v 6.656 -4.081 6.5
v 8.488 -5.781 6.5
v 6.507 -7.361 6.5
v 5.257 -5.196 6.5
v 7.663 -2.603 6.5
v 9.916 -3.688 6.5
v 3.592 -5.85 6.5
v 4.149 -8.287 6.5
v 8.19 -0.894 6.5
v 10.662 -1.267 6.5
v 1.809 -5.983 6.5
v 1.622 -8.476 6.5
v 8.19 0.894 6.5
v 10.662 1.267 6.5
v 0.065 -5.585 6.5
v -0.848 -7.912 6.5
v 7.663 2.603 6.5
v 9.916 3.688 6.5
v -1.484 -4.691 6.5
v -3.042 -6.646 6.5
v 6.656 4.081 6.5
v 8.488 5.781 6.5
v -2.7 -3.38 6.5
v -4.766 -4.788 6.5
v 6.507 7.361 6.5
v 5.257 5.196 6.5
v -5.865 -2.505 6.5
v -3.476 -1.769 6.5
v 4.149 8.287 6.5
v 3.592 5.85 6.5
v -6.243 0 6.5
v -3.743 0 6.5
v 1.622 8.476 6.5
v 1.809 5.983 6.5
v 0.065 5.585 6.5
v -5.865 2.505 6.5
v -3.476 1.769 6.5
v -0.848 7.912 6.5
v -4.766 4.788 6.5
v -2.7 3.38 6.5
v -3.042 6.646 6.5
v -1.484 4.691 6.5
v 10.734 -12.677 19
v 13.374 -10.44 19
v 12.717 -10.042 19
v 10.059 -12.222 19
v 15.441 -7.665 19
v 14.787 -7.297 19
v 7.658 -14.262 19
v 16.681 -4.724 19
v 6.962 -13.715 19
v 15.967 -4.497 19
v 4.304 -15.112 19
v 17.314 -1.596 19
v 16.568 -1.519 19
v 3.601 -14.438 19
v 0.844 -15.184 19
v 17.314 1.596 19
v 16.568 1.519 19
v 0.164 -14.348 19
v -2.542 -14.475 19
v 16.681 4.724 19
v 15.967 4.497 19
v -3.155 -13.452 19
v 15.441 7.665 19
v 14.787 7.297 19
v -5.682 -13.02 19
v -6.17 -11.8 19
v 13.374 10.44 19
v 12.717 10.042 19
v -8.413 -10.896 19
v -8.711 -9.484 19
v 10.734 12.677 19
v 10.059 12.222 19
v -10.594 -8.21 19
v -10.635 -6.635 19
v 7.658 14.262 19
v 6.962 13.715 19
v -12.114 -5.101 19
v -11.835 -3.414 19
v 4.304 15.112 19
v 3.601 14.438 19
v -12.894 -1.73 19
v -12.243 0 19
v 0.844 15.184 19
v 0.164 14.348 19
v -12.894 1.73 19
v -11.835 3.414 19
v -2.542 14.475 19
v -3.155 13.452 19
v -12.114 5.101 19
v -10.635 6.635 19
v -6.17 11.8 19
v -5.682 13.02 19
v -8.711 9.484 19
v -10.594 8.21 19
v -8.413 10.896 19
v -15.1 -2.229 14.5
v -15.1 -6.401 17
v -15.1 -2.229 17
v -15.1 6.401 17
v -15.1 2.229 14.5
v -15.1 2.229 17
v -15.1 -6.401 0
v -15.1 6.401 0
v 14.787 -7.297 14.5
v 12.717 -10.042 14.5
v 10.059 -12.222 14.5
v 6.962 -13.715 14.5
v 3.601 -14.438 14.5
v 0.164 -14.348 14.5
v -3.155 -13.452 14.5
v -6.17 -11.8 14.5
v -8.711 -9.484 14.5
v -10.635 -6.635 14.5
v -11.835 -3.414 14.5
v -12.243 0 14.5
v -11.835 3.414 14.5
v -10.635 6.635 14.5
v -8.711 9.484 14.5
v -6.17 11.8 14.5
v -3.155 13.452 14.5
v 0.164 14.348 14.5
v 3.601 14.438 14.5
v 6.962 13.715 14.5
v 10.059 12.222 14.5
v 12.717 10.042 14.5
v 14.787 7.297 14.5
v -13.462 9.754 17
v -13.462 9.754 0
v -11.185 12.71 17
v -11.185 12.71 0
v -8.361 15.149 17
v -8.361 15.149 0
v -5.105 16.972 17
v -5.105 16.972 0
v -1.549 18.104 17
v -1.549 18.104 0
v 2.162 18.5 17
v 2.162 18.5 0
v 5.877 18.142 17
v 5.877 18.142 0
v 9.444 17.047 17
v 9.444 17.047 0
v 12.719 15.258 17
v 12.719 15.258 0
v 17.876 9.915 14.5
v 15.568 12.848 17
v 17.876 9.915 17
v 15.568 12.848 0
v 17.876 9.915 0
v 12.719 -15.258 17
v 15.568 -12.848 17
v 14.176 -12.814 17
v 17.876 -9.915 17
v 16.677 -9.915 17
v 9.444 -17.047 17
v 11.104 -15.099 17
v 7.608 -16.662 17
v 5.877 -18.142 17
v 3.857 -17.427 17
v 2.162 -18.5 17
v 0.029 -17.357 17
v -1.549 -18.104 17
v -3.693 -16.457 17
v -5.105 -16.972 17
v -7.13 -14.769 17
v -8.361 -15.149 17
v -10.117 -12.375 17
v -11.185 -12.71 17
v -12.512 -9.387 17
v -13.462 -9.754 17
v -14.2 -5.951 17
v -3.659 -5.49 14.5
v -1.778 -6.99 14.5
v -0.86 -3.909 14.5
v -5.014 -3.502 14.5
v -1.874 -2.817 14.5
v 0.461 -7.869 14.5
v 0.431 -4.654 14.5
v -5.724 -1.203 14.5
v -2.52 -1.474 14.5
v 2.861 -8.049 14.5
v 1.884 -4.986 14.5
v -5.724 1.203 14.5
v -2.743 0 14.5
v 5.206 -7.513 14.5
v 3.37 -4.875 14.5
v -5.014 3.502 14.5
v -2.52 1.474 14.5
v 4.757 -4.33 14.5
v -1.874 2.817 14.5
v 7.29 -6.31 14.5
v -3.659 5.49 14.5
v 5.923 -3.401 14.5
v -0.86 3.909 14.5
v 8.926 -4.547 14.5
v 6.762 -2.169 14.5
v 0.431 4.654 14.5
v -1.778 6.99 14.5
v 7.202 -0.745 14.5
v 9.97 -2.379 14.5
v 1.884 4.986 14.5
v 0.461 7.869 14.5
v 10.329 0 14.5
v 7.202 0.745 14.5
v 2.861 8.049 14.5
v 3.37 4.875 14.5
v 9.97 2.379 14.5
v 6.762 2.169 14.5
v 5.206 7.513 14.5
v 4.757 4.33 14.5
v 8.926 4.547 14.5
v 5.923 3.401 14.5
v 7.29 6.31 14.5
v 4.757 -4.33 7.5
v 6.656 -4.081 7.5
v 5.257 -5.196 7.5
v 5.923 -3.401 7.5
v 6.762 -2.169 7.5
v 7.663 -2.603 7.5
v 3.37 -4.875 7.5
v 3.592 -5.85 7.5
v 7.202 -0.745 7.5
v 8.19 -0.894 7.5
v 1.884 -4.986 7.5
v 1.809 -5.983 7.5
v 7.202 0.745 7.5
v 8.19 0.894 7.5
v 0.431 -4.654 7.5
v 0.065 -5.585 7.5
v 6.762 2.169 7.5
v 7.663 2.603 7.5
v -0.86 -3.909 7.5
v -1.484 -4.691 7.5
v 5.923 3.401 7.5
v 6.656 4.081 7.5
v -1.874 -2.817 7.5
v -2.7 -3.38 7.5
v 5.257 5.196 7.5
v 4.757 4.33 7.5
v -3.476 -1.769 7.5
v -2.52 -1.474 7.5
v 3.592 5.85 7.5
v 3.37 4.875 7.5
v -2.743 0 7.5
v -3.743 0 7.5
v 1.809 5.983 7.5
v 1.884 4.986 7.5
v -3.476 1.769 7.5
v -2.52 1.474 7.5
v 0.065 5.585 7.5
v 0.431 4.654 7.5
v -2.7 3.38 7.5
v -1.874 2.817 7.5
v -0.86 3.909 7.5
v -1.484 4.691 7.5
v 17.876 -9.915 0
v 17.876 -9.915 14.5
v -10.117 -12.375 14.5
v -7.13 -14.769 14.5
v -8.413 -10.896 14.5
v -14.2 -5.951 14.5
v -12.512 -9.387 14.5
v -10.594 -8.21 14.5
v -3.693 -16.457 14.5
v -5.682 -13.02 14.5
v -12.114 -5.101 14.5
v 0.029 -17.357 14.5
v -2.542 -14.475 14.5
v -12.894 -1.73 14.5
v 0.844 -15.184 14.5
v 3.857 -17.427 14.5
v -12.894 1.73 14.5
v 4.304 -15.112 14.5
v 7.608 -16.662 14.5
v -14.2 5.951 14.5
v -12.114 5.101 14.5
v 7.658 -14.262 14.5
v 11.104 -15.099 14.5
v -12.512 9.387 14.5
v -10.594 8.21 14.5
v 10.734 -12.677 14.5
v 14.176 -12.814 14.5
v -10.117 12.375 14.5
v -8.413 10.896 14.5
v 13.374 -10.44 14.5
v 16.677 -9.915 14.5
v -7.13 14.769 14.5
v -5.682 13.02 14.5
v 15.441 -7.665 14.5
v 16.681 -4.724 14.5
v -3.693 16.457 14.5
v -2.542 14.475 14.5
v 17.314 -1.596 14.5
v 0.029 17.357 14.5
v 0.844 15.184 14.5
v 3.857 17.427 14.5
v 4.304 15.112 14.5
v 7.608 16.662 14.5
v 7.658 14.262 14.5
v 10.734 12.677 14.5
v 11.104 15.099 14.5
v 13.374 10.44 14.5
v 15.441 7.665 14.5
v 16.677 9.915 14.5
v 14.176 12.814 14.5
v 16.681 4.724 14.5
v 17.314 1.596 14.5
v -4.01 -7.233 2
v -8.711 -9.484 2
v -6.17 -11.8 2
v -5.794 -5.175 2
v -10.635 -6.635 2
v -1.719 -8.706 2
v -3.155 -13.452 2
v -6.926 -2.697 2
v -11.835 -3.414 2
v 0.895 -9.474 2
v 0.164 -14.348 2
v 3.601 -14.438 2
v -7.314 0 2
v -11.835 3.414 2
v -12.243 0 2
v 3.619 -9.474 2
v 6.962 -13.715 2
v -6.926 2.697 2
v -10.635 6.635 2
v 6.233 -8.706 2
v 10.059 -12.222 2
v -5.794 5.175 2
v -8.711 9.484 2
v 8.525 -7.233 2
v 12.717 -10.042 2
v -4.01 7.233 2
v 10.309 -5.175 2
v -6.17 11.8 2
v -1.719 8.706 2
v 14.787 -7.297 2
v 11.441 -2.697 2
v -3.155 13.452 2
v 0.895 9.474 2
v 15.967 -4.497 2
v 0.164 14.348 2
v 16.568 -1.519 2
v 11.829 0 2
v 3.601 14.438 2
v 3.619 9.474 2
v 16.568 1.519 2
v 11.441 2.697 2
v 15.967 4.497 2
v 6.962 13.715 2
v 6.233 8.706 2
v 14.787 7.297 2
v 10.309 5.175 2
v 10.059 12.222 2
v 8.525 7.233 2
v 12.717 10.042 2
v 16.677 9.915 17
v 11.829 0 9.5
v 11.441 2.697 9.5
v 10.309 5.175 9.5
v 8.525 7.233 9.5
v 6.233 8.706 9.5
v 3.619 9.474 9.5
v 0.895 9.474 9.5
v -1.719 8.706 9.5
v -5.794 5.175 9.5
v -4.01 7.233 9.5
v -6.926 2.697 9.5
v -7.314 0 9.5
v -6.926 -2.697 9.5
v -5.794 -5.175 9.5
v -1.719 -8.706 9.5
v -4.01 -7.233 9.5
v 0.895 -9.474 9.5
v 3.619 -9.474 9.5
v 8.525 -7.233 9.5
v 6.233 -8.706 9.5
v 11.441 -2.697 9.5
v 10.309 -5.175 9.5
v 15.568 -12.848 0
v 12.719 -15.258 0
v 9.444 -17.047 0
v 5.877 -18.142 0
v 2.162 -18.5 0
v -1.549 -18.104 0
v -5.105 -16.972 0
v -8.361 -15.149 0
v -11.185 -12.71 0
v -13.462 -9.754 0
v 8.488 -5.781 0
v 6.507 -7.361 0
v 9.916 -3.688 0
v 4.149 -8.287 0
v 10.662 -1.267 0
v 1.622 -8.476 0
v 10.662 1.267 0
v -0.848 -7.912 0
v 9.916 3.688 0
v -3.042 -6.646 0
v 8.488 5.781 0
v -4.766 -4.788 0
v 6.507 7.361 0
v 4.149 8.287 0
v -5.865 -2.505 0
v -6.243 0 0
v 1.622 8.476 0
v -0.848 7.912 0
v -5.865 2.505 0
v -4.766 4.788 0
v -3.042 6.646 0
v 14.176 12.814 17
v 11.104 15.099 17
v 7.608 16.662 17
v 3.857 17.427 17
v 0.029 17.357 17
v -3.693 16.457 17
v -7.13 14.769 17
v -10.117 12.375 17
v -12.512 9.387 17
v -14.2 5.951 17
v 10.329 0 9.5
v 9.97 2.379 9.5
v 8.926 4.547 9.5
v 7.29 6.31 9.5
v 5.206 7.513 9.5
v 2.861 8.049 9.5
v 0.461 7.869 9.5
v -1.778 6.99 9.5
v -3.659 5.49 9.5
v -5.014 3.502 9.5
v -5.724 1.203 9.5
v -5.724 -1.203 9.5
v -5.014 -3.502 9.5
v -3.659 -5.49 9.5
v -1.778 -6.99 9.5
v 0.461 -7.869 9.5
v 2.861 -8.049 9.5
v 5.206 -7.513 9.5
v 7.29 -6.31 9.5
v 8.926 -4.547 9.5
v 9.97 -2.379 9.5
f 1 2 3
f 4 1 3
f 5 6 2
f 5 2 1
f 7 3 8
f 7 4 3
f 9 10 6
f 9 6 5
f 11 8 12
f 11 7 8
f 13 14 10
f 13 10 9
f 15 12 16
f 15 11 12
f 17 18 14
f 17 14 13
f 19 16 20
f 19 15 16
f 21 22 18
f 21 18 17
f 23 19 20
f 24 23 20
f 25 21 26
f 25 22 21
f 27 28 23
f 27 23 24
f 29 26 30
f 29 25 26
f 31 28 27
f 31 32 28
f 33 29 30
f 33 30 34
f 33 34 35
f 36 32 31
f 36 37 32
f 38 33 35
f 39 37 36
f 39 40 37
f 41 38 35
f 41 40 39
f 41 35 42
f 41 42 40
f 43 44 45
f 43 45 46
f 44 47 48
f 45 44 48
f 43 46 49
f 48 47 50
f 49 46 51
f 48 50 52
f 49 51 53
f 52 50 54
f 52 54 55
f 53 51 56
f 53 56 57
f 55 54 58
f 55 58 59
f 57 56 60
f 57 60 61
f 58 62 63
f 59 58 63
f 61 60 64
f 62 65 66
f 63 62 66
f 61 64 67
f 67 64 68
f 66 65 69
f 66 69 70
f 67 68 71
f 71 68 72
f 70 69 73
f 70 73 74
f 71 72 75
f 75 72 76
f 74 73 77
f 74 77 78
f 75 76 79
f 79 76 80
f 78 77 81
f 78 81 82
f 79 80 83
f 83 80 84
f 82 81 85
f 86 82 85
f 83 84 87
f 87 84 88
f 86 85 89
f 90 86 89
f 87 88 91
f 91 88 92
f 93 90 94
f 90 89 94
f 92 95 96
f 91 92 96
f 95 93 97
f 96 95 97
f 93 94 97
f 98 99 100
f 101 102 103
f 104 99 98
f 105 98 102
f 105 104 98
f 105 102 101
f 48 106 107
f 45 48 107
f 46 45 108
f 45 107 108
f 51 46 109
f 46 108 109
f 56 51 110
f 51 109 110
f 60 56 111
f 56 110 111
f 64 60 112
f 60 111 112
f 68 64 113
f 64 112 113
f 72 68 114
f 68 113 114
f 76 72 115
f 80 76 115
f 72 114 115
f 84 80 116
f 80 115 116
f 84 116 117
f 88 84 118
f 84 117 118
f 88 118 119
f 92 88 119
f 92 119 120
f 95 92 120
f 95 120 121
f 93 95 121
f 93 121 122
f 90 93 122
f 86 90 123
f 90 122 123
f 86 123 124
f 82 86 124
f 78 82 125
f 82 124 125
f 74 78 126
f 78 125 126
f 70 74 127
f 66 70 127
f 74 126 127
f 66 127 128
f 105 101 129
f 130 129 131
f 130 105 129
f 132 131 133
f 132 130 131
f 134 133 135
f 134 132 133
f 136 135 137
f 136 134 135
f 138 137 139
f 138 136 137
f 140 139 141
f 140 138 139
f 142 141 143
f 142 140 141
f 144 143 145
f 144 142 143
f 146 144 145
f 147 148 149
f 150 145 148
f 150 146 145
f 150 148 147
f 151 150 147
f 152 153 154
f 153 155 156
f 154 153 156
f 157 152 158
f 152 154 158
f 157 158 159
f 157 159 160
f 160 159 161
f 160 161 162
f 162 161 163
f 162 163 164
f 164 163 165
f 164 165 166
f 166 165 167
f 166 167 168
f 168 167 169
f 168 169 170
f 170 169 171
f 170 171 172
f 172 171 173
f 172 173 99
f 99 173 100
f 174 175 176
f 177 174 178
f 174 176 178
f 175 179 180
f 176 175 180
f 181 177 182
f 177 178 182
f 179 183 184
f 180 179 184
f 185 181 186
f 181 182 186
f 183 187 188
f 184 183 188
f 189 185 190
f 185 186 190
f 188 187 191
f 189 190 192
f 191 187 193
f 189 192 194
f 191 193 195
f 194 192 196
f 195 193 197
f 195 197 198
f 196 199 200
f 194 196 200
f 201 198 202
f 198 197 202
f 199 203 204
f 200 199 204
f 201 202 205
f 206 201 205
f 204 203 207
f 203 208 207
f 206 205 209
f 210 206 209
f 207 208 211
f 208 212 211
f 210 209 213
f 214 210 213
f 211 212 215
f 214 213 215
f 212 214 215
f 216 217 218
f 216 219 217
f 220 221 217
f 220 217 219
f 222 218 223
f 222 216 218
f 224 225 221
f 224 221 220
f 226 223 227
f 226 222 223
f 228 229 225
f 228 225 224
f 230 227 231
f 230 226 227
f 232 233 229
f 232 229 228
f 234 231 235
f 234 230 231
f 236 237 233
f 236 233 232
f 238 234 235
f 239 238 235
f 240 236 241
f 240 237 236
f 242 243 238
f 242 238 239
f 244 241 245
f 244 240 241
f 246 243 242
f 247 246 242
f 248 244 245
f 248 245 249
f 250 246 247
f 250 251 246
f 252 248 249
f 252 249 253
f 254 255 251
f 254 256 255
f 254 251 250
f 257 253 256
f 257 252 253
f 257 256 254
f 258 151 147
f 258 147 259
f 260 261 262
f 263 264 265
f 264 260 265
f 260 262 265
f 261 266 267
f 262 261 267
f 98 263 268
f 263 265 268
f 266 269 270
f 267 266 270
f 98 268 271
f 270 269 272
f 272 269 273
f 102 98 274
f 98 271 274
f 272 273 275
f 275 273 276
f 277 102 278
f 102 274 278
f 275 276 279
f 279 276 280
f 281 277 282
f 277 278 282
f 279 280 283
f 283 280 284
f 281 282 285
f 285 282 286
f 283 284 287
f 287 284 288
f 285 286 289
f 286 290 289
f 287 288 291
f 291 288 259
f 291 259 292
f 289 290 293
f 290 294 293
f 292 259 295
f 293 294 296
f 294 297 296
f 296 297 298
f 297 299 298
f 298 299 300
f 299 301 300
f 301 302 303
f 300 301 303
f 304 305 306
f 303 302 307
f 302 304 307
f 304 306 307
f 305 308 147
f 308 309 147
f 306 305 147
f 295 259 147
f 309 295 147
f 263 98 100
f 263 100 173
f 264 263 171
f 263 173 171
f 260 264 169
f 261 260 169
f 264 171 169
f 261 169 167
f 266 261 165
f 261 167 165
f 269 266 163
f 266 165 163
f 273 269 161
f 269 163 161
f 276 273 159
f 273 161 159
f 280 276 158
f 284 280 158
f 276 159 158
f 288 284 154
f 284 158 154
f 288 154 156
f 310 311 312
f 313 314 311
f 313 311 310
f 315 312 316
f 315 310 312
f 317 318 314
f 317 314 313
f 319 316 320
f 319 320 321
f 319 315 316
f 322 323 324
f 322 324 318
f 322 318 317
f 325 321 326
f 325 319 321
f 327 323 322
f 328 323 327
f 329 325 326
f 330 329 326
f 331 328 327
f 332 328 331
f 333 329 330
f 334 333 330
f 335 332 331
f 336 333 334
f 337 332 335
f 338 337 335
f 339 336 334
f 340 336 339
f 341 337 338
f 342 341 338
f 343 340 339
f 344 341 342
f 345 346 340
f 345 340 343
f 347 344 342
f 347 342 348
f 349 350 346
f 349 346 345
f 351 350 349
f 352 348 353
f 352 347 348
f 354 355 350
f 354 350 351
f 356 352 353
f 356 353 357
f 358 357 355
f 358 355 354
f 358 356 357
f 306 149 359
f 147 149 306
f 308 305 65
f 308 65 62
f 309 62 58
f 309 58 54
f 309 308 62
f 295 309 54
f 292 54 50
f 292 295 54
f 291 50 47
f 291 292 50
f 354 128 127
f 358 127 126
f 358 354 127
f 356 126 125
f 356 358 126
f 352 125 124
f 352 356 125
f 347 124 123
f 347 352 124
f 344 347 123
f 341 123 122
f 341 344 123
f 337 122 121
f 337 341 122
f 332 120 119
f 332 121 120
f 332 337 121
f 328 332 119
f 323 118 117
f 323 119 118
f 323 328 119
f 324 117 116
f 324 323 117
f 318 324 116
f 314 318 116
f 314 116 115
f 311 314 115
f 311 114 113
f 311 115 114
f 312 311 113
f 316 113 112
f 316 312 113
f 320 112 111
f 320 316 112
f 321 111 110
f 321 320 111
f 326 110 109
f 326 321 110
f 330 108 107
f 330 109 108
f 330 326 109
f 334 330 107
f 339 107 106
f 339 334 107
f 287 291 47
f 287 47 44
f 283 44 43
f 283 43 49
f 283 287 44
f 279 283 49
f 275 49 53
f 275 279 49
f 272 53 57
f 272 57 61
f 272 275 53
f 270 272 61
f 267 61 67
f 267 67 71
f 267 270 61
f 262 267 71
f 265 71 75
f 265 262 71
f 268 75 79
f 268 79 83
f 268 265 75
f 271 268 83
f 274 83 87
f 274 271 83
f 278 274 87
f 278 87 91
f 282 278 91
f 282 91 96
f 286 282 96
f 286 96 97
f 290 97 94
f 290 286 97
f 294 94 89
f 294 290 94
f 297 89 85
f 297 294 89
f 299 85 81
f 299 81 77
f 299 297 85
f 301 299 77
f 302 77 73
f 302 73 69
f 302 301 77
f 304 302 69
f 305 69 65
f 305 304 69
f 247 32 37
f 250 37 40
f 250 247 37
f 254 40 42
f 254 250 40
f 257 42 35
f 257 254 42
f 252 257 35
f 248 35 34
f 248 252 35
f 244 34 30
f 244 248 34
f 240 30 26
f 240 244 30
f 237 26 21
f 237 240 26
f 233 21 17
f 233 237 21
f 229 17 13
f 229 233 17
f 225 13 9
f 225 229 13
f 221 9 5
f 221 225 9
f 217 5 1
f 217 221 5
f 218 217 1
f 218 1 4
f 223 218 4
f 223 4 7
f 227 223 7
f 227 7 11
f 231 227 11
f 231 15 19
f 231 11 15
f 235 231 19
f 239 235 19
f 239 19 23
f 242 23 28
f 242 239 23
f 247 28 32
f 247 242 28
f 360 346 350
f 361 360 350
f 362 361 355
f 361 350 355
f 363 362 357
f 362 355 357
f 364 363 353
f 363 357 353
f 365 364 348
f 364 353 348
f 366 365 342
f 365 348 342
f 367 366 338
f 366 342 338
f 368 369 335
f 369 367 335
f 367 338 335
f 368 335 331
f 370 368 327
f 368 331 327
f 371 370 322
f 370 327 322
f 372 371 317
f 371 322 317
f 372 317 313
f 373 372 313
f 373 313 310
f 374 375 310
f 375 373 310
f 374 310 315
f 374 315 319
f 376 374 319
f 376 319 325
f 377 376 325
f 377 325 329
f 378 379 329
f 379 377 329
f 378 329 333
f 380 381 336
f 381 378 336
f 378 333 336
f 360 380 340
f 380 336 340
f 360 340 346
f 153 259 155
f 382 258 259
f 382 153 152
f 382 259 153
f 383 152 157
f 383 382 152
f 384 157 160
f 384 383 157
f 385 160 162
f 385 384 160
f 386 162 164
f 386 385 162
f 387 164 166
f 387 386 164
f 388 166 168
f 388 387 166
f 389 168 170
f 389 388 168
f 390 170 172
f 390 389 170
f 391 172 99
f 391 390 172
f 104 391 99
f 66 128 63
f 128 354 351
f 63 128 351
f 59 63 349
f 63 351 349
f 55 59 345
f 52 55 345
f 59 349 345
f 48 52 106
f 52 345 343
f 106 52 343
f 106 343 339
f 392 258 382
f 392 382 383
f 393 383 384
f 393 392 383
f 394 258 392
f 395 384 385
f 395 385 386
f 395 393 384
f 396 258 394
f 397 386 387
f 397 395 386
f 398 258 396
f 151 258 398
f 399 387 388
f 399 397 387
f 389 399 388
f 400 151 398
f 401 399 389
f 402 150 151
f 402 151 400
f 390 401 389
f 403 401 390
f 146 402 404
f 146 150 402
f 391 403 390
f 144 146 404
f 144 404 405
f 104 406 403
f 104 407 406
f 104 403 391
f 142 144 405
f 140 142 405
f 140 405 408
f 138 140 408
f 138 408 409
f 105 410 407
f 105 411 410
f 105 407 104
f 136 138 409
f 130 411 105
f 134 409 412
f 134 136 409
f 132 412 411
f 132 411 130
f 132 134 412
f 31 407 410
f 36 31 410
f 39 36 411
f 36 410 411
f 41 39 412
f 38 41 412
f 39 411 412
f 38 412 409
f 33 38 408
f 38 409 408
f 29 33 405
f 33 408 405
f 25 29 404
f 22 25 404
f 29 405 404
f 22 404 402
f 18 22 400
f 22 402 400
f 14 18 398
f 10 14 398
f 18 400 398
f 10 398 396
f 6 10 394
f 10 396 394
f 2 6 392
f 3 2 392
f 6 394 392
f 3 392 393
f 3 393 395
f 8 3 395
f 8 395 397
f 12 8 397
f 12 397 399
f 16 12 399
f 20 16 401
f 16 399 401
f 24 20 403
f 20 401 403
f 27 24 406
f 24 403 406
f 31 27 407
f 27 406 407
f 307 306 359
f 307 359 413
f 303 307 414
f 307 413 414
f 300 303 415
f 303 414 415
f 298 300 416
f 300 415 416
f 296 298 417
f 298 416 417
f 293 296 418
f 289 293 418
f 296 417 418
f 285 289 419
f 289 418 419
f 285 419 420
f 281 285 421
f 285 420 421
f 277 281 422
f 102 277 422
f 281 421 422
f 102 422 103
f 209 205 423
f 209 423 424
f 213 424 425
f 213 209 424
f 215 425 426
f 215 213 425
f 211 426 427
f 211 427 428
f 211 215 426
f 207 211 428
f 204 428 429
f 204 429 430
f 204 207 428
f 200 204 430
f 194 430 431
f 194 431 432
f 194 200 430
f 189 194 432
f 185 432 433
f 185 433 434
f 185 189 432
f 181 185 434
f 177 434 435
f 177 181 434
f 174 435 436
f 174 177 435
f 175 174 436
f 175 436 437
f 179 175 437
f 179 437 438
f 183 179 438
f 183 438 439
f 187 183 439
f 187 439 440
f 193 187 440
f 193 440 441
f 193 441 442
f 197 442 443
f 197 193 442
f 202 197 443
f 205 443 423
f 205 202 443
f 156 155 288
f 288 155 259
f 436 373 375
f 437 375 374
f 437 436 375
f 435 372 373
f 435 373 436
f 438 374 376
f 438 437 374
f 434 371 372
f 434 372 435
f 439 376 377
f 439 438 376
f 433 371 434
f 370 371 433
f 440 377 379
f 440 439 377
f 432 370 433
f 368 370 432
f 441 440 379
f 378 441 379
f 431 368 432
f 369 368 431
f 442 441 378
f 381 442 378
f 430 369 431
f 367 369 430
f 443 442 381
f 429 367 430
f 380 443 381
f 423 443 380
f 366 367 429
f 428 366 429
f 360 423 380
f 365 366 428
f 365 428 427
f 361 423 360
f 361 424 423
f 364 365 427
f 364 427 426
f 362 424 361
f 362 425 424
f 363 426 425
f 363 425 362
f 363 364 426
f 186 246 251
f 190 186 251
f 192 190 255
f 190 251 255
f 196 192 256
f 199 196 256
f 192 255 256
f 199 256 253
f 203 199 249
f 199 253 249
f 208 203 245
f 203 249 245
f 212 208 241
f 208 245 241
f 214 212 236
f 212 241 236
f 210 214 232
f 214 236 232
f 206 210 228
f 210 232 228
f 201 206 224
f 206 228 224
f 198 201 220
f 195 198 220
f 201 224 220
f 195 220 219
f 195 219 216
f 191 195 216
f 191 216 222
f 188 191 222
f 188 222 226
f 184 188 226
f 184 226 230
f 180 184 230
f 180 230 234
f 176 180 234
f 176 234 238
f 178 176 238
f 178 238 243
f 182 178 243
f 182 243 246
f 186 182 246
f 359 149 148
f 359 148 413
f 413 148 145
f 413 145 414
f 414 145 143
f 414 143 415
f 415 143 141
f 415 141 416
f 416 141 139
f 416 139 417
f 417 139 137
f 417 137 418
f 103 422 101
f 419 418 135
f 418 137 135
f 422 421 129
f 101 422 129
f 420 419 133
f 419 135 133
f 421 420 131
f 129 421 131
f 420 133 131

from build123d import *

# Parameters (mm, degrees)
BOSS_EXTRUDE1_DEPTH     = 17
CUT_EXTRUDE1_DEPTH      = 2.5
SKETCH5_W               = 2.5
SKETCH5_H               = 19.830535888
CUT_EXTRUDE2_DEPTH      = 2.5
EXTRUDE_THIN1_DEPTH     = 4.5
SKETCH8_R               = 8.5
CUT_EXTRUDE4_DEPTH      = 6.5
SKETCH9_R               = 5
CUT_EXTRUDE5_DEPTH      = 27.5
CUT_EXTRUDE6_DEPTH      = 0.5
CUT_EXTRUDE6_DEPTH_BACK = 1
SKETCH10_R              = 6
CUT_EXTRUDE7_START      = -12.5
SKETCH14_R              = 9.571158882
CUT_EXTRUDE7_DEPTH      = 12.5
SKETCH12_R              = 10.071158882
SKETCH12_R_2            = 8.071158882
CUT_EXTRUDE_THIN1_DEPTH = 5
SKETCH15_W              = 2.588485832
SKETCH15_H              = 17.190343429
CUT_EXTRUDE8_DEPTH      = 31.5


with BuildPart() as part:
    # Sketch1 → Boss-Extrude1 (new body)
    with BuildSketch(Plane.XY):
        with BuildLine():
            Line((17.875866164, 9.915267944), (17.875866164, -9.915267944))
            ThreePointArc((17.875866164, -9.915267944), (-16.242631254, 0), (17.875866164, 9.915267944))
        make_face()
    extrude(amount=BOSS_EXTRUDE1_DEPTH)

    # Sketch4 → Cut-Extrude1 (cut)
    with BuildSketch(Plane.XY.offset(17)):
        with BuildLine():
            Line((16.875866164, -9.620266797), (16.875866164, 9.620266797))
            ThreePointArc((16.875866164, 9.620266797), (-15.242631254, 0), (16.875866164, -9.620266797))
        make_face()
    extrude(amount=-CUT_EXTRUDE1_DEPTH, mode=Mode.SUBTRACT)

    # Sketch5 → Cut-Extrude2 (cut)
    with BuildSketch(Plane(origin=(17.875866164, 0, 0), x_dir=(0, 0, -1), z_dir=(1, 0, 0))):
        with Locations((-15.75, 0)):
            Rectangle(SKETCH5_W, SKETCH5_H)
    extrude(amount=-CUT_EXTRUDE2_DEPTH, mode=Mode.SUBTRACT)

    # Sketch6 → Extrude-Thin1 (add)
    with BuildSketch(Plane.XY.offset(14.5)):
        with BuildLine():
            ThreePointArc((15.440925449, 7.665267944), (17.39404784, 0), (15.440925449, -7.665267944))
            ThreePointArc((15.440925449, -7.665267944), (-12.992631254, 0), (15.440925449, 7.665267944))
        make_face()
        with BuildLine():
            ThreePointArc((14.787338867, 7.297249398), (16.64404784, 0), (14.787338867, -7.297249398))
            ThreePointArc((14.787338867, -7.297249398), (-12.242631254, 0), (14.787338867, 7.297249398))
        make_face(mode=Mode.SUBTRACT)
    extrude(amount=EXTRUDE_THIN1_DEPTH)

    # Sketch8 → Cut-Extrude4 (cut)
    with BuildSketch(Plane(origin=(0, 0, 0), x_dir=(-1, 0, 0), z_dir=(0, 0, -1))):
        with Locations((-2.257368746, 0)):
            Circle(SKETCH8_R)
    extrude(amount=-CUT_EXTRUDE4_DEPTH, mode=Mode.SUBTRACT)

    # Sketch9 → Cut-Extrude5 (cut)
    with BuildSketch(Plane(origin=(0, 0, 6.5), x_dir=(-1, 0, 0), z_dir=(0, 0, -1))):
        with Locations((-2.257368746, 0)):
            Circle(SKETCH9_R)
    extrude(amount=-CUT_EXTRUDE5_DEPTH, mode=Mode.SUBTRACT)

    # Sketch10 → Cut-Extrude6 (cut, two sides: drawn at the far end of the back side and taken through both)
    with BuildSketch(Plane(origin=(0, 0, 6.5), x_dir=(-1, 0, 0), z_dir=(0, 0, -1)).offset(-CUT_EXTRUDE6_DEPTH_BACK)):
        with Locations((-2.257368746, 0)):
            Circle(SKETCH10_R)
    extrude(amount=CUT_EXTRUDE6_DEPTH + CUT_EXTRUDE6_DEPTH_BACK, mode=Mode.SUBTRACT)

    # Sketch14 → Cut-Extrude7 (cut)
    with BuildSketch(Plane.XY.offset(14.5).offset(CUT_EXTRUDE7_START)):
        with BuildLine():
            ThreePointArc((14.787338867, 7.297249398), (-12.242631254, 0), (14.787338867, -7.297249398))
            ThreePointArc((14.787338867, -7.297249398), (16.64404784, 0), (14.787338867, 7.297249398))
        make_face()
        with Locations((2.257368746, 0)):
            Circle(SKETCH14_R, mode=Mode.SUBTRACT)
    extrude(amount=CUT_EXTRUDE7_DEPTH, mode=Mode.SUBTRACT)

    # Sketch12 → Cut-Extrude-Thin1 (cut)
    with BuildSketch(Plane.XY.offset(14.5)):
        with Locations((2.257368746, 0)):
            Circle(SKETCH12_R)
        with Locations((2.257368746, 0)):
            Circle(SKETCH12_R_2, mode=Mode.SUBTRACT)
    extrude(amount=-CUT_EXTRUDE_THIN1_DEPTH, mode=Mode.SUBTRACT)

    # Sketch15 → Cut-Extrude8 (cut)
    with BuildSketch(Plane.XY):
        with Locations((-16.39432519, -0.486978568)):
            Rectangle(SKETCH15_W, SKETCH15_H)
    extrude(amount=CUT_EXTRUDE8_DEPTH, mode=Mode.SUBTRACT)


solid = part.part
